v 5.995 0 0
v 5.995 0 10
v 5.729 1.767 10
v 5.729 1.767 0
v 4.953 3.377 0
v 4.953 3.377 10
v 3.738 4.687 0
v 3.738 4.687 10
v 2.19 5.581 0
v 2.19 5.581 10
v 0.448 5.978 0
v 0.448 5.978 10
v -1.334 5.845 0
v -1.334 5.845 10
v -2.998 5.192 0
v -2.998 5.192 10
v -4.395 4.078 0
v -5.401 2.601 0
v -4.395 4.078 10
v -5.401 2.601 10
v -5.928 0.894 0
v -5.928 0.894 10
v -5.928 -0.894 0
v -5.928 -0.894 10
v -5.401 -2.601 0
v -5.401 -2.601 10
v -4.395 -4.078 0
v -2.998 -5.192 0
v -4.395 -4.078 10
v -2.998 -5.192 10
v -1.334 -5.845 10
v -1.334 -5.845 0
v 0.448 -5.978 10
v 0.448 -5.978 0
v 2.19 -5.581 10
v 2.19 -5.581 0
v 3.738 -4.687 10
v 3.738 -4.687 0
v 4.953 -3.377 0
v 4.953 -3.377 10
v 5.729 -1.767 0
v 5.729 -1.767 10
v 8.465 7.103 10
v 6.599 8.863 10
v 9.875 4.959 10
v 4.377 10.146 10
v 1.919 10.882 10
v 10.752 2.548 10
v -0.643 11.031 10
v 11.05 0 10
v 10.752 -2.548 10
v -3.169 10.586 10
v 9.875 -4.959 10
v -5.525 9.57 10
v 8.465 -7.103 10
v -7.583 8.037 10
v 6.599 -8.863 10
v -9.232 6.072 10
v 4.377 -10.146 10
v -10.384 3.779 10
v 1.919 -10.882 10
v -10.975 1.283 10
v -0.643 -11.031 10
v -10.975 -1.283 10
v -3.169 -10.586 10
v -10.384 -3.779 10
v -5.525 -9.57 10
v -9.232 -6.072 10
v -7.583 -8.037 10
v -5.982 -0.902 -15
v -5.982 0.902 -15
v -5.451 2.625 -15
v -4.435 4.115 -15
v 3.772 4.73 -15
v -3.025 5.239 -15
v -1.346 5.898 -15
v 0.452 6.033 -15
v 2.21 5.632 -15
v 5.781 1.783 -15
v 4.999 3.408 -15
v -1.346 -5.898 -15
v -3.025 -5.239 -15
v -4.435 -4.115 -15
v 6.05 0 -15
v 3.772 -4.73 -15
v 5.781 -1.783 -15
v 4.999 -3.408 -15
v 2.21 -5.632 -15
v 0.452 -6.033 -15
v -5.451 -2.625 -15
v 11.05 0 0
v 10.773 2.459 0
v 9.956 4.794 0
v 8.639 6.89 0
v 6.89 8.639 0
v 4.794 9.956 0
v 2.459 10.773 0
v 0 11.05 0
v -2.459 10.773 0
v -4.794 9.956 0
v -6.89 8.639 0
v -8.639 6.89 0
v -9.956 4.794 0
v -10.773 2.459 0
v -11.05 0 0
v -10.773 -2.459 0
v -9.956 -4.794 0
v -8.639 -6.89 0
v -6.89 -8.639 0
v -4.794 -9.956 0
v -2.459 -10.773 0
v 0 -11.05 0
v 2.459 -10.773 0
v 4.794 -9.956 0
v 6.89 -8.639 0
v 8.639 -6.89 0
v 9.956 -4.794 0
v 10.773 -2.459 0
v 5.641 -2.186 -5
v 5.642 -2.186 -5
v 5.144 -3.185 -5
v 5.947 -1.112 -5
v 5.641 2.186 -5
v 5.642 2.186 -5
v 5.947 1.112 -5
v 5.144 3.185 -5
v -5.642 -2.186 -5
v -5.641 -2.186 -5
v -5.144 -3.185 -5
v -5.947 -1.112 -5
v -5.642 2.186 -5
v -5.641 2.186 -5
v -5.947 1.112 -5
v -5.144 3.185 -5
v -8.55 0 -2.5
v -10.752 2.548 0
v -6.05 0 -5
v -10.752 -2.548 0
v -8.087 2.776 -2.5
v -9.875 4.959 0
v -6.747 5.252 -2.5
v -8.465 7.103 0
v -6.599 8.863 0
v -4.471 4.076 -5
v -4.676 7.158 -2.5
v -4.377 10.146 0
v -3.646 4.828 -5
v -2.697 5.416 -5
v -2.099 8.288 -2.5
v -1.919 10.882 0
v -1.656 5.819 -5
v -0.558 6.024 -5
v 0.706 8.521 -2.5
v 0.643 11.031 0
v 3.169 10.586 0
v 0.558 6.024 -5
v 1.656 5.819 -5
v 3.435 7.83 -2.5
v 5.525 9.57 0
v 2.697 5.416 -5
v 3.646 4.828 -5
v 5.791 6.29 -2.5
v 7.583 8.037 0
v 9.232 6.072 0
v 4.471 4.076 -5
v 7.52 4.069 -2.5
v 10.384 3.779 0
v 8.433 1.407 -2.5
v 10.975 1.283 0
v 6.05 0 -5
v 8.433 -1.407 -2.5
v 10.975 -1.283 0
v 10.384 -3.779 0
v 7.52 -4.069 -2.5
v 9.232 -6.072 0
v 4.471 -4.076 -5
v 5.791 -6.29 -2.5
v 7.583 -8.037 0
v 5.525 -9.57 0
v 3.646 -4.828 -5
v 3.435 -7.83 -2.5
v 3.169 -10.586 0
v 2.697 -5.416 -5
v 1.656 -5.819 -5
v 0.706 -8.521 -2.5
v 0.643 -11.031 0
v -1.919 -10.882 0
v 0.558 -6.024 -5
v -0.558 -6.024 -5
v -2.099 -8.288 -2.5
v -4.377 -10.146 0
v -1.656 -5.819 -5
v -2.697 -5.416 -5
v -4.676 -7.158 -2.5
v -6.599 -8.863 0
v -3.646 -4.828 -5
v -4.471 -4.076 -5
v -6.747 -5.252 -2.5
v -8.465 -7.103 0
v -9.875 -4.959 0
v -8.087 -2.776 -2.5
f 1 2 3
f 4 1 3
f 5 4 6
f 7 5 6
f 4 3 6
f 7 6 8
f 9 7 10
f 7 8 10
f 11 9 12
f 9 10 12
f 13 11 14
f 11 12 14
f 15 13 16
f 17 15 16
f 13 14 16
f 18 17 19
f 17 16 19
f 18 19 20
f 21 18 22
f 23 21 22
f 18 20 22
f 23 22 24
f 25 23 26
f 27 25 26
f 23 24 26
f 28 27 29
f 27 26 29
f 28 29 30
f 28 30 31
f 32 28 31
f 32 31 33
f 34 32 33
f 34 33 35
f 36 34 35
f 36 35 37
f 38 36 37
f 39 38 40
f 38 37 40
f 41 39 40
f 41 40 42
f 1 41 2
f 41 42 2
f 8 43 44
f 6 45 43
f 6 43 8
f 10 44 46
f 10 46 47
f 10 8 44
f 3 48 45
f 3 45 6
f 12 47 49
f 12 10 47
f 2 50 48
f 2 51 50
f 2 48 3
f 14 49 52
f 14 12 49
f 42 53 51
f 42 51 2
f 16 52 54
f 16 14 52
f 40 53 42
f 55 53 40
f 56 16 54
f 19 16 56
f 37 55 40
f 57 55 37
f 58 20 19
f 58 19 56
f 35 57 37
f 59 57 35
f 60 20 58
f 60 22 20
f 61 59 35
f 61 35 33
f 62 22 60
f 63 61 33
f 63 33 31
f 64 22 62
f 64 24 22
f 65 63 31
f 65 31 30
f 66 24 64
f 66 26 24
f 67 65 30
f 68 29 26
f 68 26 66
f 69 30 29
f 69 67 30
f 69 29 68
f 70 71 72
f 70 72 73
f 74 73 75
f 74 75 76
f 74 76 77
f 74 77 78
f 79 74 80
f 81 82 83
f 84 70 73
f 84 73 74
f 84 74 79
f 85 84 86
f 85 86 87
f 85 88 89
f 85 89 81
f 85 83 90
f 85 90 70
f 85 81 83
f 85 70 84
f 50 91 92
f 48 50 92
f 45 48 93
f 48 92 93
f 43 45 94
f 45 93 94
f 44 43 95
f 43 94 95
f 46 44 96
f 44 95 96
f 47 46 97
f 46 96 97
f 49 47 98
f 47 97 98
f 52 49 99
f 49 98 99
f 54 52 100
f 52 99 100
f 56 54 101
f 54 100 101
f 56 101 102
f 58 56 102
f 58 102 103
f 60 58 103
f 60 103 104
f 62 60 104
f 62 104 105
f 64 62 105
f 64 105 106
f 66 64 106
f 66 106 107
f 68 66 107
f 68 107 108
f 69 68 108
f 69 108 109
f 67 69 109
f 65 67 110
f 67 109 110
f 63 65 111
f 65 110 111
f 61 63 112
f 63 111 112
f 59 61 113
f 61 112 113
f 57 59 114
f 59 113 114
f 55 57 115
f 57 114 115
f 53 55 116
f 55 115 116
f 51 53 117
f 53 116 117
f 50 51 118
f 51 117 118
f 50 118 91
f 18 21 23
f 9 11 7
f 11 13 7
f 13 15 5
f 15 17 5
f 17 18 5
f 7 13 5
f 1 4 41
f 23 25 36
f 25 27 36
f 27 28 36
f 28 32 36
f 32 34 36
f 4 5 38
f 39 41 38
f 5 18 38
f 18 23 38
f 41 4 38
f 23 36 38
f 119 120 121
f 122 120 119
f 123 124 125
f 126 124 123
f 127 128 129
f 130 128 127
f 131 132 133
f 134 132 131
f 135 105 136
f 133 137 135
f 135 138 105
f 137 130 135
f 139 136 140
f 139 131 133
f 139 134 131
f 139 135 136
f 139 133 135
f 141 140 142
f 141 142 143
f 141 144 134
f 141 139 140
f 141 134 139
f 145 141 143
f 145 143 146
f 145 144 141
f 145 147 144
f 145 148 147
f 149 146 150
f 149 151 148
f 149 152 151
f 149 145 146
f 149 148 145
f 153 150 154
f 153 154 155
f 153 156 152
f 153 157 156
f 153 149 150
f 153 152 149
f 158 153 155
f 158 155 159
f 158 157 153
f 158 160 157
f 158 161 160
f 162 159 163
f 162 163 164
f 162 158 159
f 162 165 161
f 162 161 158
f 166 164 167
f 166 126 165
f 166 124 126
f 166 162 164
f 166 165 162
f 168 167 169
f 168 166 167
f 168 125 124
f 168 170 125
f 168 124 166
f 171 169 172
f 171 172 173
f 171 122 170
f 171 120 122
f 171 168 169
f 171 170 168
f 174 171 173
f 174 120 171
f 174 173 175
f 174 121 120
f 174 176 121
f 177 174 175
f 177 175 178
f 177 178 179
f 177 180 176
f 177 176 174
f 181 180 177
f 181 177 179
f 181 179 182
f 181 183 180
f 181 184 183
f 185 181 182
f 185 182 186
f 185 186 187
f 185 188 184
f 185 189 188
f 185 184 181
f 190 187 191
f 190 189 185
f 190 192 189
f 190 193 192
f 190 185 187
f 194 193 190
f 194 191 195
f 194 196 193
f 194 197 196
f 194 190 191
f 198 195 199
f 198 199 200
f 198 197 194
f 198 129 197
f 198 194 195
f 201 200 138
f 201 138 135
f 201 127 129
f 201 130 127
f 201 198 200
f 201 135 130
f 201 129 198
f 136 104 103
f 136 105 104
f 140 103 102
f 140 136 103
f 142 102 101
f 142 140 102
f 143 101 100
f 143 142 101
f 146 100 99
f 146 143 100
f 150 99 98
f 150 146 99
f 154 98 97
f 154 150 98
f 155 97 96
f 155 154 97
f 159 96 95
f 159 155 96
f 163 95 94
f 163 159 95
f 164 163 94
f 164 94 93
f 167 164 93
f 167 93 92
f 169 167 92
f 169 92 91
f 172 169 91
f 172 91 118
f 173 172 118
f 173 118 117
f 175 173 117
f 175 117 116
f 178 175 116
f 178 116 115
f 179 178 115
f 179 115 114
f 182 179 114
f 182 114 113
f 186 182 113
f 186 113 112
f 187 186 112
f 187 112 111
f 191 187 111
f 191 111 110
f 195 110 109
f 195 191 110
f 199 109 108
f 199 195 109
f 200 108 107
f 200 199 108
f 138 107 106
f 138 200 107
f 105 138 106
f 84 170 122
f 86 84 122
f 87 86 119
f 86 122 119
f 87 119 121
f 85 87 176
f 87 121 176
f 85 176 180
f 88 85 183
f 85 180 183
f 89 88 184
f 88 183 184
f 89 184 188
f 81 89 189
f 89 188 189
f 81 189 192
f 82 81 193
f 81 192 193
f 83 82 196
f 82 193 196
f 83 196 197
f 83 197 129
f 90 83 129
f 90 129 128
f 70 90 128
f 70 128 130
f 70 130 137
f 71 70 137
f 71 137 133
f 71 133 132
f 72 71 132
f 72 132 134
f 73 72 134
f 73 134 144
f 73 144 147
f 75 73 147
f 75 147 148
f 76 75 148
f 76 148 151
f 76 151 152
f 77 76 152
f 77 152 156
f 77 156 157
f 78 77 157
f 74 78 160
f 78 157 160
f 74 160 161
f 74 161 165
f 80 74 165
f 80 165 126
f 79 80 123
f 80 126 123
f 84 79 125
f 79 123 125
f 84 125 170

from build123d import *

# Parameters (mm, degrees)
SKETCH1_R           = 11.05
SKETCH1_R_2         = 6.05
BOSS_EXTRUDE1_DEPTH = 10
SKETCH2_R           = 6.05
BOSS_EXTRUDE2_DEPTH = 15
BOSS_EXTRUDE3_START = 5
SKETCH3_R           = 11.05
BOSS_EXTRUDE3_DEPTH = 5
CHAMFER1_SIZE       = 5
SKETCH4_R           = 6.05
SKETCH4_R_2         = 5.995
BOSS_EXTRUDE4_DEPTH = 10


with BuildPart() as part:
    # Sketch1 → Boss-Extrude1 (new body)
    with BuildSketch(Plane.XY):
        Circle(SKETCH1_R)
        Circle(SKETCH1_R_2, mode=Mode.SUBTRACT)
    extrude(amount=BOSS_EXTRUDE1_DEPTH)



with BuildPart() as body_2:
    # Sketch2 → Boss-Extrude2 (new body)
    with BuildSketch(Plane(origin=(0, 0, 0), x_dir=(-1, 0, 0), z_dir=(0, 0, -1))):
        with Locations(Location((0, 0, 0), (0, 0, 180))):
            Circle(SKETCH2_R)
    extrude(amount=BOSS_EXTRUDE2_DEPTH)


with BuildPart() as part_1:
    add(part.part)

    add(body_2.part)  # Boss-Extrude3 merges body 2
    # Sketch3 → Boss-Extrude3 (add)
    with BuildSketch(Plane(origin=(0, 0, 0), x_dir=(-1, 0, 0), z_dir=(0, 0, -1)).offset(BOSS_EXTRUDE3_START)):
        Circle(SKETCH3_R)
    extrude(amount=-BOSS_EXTRUDE3_DEPTH)

    # Chamfer1
    chamfer1_edges = [part_1.edges().sort_by_distance(p)[0] for p in [
        (11.05, 0, -5),
    ]]
    chamfer(chamfer1_edges, length=CHAMFER1_SIZE - 0.0001)  # a hair under: the kernel refuses the full size

    # Sketch4 → Boss-Extrude4 (add)
    with BuildSketch(Plane.XY.offset(10)):
        with Locations(Location((0, 0, 0), (0, 0, 180))):
            Circle(SKETCH4_R)
        Circle(SKETCH4_R_2, mode=Mode.SUBTRACT)
    extrude(amount=-BOSS_EXTRUDE4_DEPTH)


solid = part_1.part
